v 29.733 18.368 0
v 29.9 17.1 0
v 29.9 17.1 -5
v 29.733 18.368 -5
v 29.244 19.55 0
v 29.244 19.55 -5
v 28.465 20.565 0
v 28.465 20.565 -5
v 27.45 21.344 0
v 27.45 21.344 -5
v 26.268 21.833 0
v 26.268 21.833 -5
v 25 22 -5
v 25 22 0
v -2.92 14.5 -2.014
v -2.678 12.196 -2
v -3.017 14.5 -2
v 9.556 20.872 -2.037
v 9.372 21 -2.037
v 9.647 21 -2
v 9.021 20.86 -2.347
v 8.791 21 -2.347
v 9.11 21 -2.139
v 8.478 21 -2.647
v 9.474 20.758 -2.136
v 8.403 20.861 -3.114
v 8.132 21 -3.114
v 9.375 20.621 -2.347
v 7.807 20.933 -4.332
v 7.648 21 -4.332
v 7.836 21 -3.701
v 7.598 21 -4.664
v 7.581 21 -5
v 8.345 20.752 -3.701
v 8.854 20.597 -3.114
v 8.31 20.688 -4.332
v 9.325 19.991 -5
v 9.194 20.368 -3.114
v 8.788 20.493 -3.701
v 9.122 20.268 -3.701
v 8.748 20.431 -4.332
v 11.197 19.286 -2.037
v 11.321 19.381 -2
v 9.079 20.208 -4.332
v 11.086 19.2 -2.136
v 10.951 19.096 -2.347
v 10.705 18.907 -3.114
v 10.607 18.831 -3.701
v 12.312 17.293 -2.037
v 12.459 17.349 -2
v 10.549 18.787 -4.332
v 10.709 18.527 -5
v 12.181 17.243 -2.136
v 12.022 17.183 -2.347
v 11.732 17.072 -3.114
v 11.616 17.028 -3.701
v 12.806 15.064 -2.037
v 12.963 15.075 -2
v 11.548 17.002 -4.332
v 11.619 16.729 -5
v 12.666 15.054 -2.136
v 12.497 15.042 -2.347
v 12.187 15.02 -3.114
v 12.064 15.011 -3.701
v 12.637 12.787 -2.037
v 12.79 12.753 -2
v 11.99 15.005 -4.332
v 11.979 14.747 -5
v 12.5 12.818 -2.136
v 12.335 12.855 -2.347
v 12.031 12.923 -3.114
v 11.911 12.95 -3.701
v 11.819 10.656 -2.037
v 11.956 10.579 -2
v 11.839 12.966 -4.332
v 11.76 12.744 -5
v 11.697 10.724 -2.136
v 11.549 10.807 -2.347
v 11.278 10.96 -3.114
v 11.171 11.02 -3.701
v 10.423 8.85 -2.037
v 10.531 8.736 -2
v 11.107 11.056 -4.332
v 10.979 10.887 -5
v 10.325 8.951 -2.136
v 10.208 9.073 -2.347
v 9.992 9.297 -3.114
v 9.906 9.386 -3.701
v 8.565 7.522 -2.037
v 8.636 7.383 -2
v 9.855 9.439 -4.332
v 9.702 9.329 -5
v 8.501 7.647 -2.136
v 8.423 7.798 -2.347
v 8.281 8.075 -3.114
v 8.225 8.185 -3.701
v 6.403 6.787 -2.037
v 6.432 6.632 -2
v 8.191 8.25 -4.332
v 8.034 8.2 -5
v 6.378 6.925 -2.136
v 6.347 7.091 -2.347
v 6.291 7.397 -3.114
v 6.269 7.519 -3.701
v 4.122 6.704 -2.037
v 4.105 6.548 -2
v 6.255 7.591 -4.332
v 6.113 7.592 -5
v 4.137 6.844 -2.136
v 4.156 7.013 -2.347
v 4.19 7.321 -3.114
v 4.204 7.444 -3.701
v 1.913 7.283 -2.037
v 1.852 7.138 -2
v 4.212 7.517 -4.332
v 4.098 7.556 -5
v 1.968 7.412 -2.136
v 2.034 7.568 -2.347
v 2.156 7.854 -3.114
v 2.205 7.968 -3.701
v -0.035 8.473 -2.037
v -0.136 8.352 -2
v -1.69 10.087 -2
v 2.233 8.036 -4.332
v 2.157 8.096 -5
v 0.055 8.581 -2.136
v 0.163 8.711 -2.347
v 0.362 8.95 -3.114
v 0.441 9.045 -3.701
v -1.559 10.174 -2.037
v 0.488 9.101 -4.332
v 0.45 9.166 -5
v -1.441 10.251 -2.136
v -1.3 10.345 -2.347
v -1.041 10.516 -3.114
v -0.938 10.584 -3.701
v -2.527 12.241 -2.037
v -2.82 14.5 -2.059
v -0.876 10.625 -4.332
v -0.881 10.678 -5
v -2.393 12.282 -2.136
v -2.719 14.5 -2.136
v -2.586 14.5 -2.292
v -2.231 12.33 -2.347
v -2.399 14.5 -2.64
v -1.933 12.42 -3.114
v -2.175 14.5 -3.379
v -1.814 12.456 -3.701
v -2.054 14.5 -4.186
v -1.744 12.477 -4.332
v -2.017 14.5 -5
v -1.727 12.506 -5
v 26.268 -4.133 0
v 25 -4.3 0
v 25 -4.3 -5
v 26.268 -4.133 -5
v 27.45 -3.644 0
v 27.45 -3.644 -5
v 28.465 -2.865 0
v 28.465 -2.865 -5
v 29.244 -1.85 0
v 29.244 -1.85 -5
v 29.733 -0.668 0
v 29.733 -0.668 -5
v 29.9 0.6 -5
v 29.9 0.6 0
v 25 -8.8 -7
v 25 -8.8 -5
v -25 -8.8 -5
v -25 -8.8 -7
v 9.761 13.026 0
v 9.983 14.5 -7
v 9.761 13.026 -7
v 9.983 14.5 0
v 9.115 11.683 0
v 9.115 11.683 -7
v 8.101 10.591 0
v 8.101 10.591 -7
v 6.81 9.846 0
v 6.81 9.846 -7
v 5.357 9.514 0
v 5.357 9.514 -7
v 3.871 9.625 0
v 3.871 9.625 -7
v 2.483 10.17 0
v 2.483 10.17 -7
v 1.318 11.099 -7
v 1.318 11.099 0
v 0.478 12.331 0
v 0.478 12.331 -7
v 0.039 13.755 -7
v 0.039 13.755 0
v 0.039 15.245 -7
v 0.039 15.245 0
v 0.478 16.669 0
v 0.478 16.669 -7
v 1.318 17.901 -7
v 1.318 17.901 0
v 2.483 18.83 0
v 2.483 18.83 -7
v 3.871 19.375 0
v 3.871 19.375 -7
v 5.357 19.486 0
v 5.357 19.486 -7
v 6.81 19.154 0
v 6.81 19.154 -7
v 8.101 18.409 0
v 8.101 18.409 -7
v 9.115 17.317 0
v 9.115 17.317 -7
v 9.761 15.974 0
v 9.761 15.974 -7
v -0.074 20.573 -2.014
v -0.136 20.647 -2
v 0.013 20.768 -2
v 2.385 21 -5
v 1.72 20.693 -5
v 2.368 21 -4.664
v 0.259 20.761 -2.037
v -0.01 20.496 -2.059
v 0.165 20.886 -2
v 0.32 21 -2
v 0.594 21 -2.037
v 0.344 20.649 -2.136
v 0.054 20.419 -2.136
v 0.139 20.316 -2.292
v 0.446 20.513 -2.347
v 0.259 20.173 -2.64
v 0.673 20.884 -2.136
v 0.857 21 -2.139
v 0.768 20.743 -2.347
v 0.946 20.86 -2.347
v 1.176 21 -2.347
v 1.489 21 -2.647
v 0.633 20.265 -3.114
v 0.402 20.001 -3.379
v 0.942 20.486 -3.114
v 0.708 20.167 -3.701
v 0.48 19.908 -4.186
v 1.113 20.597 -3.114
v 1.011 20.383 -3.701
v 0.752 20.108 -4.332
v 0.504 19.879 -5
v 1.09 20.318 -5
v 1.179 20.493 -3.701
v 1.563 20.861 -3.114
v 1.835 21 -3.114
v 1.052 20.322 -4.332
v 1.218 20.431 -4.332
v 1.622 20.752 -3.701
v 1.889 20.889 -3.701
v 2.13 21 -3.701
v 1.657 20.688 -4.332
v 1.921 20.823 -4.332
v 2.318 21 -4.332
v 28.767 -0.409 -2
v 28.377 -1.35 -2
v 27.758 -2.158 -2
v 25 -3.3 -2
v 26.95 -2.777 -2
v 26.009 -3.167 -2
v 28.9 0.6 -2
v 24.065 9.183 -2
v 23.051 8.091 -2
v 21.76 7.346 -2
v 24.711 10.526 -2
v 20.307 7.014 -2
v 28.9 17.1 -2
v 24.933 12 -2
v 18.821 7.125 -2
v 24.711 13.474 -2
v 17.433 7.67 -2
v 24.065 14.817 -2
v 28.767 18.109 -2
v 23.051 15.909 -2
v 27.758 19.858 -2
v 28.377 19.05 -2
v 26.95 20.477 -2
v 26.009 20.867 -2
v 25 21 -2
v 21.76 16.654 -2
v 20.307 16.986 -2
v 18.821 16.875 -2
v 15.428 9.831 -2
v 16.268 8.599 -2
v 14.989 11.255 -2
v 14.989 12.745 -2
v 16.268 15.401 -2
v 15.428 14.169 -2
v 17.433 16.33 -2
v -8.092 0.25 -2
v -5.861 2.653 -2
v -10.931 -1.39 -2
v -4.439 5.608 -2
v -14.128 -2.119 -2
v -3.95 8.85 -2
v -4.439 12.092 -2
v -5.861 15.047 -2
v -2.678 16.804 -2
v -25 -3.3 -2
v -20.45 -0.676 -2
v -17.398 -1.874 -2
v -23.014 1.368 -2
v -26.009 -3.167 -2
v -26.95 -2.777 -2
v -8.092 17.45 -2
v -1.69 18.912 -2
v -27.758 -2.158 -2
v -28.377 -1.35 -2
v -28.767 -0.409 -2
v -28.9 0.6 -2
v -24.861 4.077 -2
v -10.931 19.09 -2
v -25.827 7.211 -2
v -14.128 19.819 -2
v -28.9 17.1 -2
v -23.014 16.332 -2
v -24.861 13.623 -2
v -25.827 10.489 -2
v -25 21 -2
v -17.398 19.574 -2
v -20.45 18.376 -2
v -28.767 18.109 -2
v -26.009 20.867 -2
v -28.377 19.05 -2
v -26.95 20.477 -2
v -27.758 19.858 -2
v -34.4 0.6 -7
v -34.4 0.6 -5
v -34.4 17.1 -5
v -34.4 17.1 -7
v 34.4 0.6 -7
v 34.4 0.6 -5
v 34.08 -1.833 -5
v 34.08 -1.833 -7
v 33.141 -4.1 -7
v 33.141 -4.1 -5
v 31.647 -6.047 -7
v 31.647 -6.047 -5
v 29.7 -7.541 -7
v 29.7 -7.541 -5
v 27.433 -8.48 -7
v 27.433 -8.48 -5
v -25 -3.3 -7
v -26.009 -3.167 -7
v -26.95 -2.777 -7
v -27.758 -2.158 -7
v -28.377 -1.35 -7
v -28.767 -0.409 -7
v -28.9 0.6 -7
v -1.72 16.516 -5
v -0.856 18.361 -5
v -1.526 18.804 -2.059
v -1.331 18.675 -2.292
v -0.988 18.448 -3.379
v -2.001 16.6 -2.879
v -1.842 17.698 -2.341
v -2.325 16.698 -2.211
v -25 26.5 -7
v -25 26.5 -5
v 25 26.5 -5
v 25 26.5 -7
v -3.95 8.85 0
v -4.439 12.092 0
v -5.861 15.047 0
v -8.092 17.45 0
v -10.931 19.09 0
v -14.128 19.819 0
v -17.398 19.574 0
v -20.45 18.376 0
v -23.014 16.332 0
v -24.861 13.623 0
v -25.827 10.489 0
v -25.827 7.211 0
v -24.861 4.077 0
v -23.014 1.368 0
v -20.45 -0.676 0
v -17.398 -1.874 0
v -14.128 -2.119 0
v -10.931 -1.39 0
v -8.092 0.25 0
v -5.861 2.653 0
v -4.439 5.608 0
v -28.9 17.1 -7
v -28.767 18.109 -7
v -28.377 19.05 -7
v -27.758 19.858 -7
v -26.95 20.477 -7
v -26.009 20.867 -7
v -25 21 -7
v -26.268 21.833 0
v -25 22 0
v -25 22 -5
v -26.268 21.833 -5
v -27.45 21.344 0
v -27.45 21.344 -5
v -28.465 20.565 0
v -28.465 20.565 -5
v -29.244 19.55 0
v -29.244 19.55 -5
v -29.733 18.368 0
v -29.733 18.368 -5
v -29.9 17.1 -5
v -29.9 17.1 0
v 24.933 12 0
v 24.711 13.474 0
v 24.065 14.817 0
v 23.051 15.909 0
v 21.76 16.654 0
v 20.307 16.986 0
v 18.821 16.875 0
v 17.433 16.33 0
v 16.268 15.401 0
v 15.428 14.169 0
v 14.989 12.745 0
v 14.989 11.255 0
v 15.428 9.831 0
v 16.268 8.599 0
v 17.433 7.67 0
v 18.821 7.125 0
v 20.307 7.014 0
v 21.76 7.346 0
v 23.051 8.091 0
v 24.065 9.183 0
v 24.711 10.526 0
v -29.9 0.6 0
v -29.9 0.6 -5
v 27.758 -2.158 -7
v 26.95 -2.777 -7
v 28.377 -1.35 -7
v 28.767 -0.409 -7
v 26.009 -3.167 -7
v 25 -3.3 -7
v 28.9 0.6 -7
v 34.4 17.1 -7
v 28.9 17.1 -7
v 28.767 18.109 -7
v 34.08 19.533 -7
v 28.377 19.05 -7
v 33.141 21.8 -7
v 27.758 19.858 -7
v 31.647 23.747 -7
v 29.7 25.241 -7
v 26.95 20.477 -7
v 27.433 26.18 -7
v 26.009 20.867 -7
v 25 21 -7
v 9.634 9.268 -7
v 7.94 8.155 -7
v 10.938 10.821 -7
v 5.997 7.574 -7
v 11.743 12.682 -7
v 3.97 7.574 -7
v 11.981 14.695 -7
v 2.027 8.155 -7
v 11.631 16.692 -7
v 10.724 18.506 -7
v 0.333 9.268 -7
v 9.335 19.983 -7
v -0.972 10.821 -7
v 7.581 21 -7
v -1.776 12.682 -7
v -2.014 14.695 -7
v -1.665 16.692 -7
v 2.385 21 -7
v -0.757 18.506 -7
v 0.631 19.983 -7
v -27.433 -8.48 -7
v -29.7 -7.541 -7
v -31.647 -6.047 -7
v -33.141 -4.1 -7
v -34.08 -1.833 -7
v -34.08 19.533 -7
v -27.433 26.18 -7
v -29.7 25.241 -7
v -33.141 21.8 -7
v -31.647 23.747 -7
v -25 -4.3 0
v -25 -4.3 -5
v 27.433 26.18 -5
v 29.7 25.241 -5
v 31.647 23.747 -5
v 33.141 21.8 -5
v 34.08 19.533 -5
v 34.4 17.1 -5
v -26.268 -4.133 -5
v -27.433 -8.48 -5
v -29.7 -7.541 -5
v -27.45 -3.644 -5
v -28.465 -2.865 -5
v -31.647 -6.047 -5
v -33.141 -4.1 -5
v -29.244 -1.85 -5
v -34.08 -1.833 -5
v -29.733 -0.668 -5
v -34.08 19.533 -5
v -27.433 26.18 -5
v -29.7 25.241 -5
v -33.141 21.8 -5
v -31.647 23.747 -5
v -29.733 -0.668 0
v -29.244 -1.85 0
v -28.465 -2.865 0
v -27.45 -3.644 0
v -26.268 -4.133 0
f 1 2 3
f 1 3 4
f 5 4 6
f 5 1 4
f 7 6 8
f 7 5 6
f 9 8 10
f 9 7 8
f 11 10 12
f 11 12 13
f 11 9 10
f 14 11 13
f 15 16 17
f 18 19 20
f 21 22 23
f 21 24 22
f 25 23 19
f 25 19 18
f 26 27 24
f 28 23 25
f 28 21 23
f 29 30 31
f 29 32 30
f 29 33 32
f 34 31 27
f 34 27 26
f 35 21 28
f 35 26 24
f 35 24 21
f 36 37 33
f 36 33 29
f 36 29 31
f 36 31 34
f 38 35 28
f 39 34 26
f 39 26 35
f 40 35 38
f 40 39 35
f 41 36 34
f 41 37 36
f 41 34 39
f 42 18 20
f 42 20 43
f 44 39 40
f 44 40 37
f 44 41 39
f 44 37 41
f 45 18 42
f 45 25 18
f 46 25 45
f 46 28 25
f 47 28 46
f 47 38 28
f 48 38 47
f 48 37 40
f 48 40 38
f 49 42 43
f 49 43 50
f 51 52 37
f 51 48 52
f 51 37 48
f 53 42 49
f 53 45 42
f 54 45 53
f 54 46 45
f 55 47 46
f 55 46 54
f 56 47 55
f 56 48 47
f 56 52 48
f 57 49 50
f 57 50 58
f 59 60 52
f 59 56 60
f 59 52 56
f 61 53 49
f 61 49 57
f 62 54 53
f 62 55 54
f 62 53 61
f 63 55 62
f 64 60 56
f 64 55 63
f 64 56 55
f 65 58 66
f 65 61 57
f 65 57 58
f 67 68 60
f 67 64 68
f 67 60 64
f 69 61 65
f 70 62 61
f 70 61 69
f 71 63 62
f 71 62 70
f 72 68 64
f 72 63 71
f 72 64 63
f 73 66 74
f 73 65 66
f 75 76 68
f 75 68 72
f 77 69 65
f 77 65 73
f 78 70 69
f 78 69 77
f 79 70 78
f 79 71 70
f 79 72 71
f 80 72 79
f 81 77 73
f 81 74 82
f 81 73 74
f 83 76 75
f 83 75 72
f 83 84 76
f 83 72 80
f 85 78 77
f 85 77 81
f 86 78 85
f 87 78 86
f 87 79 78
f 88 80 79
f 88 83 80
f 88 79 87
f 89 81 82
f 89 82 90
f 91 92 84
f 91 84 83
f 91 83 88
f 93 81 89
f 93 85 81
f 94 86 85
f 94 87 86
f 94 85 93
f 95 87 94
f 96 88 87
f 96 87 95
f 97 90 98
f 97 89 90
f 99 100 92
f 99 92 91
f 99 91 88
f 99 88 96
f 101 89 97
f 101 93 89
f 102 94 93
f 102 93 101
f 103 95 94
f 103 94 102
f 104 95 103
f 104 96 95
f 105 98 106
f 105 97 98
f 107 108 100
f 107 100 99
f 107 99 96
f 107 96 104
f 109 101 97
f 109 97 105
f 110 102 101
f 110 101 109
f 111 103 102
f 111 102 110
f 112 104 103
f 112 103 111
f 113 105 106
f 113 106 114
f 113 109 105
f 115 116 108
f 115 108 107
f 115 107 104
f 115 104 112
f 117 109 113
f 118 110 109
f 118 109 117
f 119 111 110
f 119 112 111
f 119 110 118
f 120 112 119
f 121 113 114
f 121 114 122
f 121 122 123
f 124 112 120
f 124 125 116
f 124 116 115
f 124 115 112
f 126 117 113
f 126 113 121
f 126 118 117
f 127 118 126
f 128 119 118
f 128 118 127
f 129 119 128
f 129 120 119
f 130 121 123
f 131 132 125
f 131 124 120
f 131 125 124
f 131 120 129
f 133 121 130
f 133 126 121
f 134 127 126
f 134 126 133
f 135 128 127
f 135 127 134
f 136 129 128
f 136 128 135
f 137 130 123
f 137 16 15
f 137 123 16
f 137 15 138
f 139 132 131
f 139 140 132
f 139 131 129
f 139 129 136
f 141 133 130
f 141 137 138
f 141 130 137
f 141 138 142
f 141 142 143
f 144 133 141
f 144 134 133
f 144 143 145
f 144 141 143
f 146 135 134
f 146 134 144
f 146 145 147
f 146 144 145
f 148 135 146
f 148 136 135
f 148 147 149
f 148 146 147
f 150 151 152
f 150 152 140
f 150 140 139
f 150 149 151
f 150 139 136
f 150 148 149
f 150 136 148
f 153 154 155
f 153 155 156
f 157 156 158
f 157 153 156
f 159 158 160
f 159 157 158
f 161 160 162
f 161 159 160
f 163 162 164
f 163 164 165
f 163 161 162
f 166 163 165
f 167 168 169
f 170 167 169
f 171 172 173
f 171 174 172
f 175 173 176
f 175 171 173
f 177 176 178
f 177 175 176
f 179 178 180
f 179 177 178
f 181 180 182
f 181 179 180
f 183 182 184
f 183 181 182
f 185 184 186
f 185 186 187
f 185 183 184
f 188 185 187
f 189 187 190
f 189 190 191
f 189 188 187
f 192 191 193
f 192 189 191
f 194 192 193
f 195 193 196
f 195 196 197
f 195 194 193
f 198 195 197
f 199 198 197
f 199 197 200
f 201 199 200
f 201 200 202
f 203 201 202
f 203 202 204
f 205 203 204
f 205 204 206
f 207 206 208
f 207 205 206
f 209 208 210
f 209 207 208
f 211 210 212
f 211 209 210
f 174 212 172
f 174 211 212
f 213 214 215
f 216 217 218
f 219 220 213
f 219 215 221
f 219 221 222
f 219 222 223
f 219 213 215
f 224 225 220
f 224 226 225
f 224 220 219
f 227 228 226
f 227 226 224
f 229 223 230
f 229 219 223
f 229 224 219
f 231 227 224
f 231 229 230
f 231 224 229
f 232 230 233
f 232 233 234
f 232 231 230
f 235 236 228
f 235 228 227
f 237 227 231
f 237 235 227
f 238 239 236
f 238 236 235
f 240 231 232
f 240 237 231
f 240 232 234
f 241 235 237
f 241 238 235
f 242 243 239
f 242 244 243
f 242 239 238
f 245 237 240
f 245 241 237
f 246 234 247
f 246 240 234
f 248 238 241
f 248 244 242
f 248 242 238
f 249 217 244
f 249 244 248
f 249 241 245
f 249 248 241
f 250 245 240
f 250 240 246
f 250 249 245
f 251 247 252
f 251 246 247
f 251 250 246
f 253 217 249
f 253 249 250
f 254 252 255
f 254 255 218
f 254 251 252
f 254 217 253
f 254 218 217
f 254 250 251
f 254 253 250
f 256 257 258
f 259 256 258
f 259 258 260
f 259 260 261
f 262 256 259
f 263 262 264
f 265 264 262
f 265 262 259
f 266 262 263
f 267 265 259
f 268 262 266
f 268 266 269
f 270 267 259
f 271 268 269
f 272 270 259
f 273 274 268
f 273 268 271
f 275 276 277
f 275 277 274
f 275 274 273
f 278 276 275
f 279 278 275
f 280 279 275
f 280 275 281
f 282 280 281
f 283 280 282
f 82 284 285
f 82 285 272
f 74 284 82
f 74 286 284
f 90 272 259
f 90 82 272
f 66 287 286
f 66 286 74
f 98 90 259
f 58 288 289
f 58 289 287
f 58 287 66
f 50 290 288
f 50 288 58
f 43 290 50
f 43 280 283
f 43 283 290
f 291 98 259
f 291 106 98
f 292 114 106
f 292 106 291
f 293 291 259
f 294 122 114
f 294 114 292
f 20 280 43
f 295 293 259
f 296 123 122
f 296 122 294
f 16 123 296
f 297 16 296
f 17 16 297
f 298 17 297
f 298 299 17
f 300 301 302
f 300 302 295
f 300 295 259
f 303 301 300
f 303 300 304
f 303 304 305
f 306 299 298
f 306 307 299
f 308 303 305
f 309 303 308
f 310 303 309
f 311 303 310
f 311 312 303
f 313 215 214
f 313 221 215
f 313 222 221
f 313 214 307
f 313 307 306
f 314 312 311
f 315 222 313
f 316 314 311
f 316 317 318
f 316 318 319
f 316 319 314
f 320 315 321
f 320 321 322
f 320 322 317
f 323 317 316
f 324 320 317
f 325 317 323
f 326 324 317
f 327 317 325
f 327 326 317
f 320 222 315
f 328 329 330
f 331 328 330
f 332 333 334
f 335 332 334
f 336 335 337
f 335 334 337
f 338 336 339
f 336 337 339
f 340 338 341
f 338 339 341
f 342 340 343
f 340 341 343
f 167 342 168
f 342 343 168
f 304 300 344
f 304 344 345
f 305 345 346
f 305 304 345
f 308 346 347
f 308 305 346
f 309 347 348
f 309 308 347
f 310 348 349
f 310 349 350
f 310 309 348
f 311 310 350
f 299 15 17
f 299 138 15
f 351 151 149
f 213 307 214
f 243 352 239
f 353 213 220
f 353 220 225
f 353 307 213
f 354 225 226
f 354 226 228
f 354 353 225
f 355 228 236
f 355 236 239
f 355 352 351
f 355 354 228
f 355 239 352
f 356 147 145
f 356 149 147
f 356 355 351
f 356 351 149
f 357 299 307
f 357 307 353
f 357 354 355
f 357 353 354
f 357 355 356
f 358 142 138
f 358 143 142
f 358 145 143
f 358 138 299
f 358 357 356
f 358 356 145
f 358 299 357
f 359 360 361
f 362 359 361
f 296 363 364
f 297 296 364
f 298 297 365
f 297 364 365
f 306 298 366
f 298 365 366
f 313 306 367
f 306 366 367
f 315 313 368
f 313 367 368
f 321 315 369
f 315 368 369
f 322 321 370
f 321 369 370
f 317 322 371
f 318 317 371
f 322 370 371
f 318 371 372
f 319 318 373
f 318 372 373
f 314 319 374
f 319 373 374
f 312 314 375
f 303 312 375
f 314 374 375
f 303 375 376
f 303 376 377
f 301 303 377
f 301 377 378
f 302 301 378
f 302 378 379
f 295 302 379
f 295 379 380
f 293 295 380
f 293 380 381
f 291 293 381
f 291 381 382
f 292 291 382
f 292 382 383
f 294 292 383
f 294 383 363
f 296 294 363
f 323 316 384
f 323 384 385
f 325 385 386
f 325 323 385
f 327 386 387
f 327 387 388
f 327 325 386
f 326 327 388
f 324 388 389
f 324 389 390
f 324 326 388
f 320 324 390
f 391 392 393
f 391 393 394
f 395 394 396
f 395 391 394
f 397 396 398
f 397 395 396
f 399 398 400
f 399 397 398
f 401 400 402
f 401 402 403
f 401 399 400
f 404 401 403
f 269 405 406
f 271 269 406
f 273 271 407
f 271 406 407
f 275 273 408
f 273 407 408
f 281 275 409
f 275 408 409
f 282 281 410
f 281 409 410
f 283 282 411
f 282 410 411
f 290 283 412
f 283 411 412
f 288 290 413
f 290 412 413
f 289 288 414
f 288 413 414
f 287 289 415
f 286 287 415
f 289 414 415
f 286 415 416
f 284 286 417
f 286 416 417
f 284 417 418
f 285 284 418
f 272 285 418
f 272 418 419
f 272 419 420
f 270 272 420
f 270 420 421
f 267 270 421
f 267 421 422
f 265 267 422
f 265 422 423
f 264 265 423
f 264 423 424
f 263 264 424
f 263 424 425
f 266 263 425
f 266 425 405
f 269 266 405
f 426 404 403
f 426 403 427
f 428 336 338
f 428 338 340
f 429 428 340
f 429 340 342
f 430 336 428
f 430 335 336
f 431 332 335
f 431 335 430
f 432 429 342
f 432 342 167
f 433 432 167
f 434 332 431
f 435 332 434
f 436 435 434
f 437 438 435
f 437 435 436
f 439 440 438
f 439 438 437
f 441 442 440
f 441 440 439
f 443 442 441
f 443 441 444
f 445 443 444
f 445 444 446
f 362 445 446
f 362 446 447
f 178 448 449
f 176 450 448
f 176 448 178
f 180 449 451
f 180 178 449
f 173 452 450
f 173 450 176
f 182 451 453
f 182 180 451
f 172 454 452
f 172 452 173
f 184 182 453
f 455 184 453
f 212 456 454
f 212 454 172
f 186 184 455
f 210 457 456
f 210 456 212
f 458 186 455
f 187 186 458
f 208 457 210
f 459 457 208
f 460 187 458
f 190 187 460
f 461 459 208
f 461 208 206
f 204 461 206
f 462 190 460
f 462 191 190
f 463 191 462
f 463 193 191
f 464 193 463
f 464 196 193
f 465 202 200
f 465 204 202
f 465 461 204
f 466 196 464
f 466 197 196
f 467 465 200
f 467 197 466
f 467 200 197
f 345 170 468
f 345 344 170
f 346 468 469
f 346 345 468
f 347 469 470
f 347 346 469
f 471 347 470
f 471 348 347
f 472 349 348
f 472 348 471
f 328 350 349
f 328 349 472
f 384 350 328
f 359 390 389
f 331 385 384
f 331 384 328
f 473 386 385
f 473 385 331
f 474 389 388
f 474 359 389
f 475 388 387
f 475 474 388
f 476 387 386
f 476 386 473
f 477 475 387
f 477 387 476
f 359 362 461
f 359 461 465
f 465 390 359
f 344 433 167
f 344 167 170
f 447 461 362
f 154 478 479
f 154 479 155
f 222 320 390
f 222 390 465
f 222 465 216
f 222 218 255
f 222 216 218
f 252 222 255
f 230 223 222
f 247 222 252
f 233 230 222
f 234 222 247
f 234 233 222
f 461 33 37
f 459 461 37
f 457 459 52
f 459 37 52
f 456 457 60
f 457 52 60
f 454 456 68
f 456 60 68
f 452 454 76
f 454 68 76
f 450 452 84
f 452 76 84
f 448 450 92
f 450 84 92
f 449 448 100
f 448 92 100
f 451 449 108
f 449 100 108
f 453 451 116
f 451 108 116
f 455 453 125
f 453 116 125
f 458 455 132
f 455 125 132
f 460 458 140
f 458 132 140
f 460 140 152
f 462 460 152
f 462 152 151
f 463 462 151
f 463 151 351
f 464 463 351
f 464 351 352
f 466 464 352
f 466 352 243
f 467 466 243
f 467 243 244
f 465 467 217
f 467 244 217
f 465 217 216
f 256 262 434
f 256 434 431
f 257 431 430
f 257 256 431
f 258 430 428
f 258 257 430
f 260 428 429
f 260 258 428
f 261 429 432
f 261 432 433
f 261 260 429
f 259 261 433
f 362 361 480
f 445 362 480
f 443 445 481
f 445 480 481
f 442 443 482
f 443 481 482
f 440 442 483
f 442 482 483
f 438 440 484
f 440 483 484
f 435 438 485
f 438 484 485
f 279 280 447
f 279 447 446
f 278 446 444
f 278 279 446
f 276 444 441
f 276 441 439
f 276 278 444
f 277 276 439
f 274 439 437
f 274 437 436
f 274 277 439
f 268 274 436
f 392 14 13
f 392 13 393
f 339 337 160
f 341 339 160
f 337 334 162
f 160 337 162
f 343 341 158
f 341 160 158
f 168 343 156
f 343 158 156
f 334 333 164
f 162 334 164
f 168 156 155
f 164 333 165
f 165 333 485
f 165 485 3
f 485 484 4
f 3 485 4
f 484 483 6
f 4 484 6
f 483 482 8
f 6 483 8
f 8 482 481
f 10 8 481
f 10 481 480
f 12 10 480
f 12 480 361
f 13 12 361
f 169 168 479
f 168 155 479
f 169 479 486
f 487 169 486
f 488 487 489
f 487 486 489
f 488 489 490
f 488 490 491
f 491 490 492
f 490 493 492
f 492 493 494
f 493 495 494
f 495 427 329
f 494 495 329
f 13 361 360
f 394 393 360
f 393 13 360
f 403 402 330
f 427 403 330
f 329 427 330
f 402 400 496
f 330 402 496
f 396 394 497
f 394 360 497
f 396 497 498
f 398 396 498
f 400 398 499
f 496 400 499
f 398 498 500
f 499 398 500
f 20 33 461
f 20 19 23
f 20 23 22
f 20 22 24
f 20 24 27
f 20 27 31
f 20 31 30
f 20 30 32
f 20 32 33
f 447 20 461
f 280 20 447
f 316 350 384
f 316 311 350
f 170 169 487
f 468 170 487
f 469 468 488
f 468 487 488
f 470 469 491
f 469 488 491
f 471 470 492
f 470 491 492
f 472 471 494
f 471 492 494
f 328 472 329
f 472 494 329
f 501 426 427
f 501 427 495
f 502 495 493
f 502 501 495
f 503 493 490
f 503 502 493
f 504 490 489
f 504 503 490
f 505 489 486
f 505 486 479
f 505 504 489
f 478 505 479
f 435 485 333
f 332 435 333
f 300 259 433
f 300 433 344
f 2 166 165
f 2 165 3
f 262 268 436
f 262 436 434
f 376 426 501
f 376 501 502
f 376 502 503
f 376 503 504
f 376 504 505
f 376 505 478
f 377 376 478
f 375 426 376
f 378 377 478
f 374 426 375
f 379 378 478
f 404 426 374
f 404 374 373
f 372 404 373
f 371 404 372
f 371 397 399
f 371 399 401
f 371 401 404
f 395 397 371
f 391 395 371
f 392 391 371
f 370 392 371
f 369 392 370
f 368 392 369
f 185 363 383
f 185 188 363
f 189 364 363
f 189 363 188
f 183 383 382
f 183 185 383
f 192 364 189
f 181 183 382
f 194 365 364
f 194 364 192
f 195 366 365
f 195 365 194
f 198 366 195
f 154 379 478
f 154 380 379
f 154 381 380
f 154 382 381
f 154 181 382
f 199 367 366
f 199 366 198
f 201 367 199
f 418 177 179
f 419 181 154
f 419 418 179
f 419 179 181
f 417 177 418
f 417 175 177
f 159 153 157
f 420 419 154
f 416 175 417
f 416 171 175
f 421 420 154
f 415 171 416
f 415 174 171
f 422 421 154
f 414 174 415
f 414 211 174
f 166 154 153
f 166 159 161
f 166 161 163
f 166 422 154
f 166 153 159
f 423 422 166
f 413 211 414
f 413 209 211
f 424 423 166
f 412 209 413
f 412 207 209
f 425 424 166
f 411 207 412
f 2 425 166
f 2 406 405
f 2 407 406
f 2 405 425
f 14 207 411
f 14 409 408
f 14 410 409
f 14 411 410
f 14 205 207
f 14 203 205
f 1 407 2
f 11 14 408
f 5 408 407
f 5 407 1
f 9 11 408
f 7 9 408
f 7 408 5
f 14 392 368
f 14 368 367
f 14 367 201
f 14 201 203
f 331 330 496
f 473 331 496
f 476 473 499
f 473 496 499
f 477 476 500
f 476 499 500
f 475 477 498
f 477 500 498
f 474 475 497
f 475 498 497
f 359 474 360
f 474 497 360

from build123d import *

# Parameters (mm, degrees)
BOSS_EXTRUDE1_DEPTH = 5
BOSS_EXTRUDE3_DEPTH = 2
CUT_EXTRUDE1_START  = -3
CUT_EXTRUDE1_DEPTH  = 3
SKETCH4_R           = 5
SKETCH4_R_2         = 11
CUT_EXTRUDE2_DEPTH  = 44.984201709
SKETCH5_R           = 7
SKETCH5_R_2         = 5
BOSS_EXTRUDE4_DEPTH = 5
FILLET1_SIZE        = 1
FILLET1_SIZE_2      = 3


with BuildPart() as part:
    # Sketch1 → Boss-Extrude1 (new body)
    with BuildSketch(Plane.XY):
        with BuildLine():
            Line((-29.9, 17.1), (-29.9, 0.6))
            ThreePointArc((-29.9, 0.6), (-28.464823228, -2.864823228), (-25, -4.3))
            Line((-25, -4.3), (25, -4.3))
            ThreePointArc((25, -4.3), (28.464823228, -2.864823228), (29.9, 0.6))
            Line((29.9, 0.6), (29.9, 17.1))
            ThreePointArc((29.9, 17.1), (28.464823228, 20.564823228), (25, 22))
            Line((25, 22), (-25, 22))
            ThreePointArc((-25, 22), (-28.464823228, 20.564823228), (-29.9, 17.1))
        make_face()
    extrude(amount=-BOSS_EXTRUDE1_DEPTH)

    # Sketch2 → Boss-Extrude3 (add)
    with BuildSketch(Plane(origin=(0, 0, -5), x_dir=(-1, 0, 0), z_dir=(0, 0, -1))):
        with BuildLine():
            Line((34.4, 0.6), (34.4, 17.1))
            ThreePointArc((34.4, 17.1), (31.646803743, 23.746803743), (25, 26.5))
            Line((25, 26.5), (-25, 26.5))
            ThreePointArc((-25, 26.5), (-31.646803743, 23.746803743), (-34.4, 17.1))
            Line((-34.4, 17.1), (-34.4, 0.6))
            ThreePointArc((-34.4, 0.6), (-31.646803743, -6.046803743), (-25, -8.8))
            Line((-25, -8.8), (25, -8.8))
            ThreePointArc((25, -8.8), (31.646803743, -6.046803743), (34.4, 0.6))
        make_face()
        with BuildLine():
            Line((28.9, 0.6), (28.9, 17.1))
            ThreePointArc((28.9, 17.1), (27.757716447, 19.857716447), (25, 21))
            Line((25, 21), (-25, 21))
            ThreePointArc((-25, 21), (-27.757716447, 19.857716447), (-28.9, 17.1))
            Line((-28.9, 17.1), (-28.9, 0.6))
            ThreePointArc((-28.9, 0.6), (-27.757716447, -2.157716447), (-25, -3.3))
            Line((-25, -3.3), (25, -3.3))
            ThreePointArc((25, -3.3), (27.757716447, -2.157716447), (28.9, 0.6))
        make_face(mode=Mode.SUBTRACT)
    extrude(amount=BOSS_EXTRUDE3_DEPTH)

    # Sketch3 → Cut-Extrude1 (cut)
    with BuildSketch(Plane(origin=(0, 0, -5), x_dir=(-1, 0, 0), z_dir=(0, 0, -1)).offset(CUT_EXTRUDE1_START)):
        with BuildLine():
            Line((-25, -3.3), (25, -3.3))
            ThreePointArc((25, -3.3), (27.757716447, -2.157716447), (28.9, 0.6))
            Line((28.9, 0.6), (28.9, 17.1))
            ThreePointArc((28.9, 17.1), (27.757716447, 19.857716447), (25, 21))
            Line((25, 21), (-25, 21))
            ThreePointArc((-25, 21), (-27.757716447, 19.857716447), (-28.9, 17.1))
            Line((-28.9, 17.1), (-28.9, 0.6))
            ThreePointArc((-28.9, 0.6), (-27.757716447, -2.157716447), (-25, -3.3))
        make_face()
    extrude(amount=CUT_EXTRUDE1_DEPTH, mode=Mode.SUBTRACT)

    # Sketch4 → Cut-Extrude2 (cut, through all)
    with BuildSketch(Plane.XY):
        with Locations((4.983333333, 14.5)):
            Circle(SKETCH4_R)
        with Locations((-14.95, 8.85)):
            Circle(SKETCH4_R_2)
        with Locations((19.933333333, 12)):
            Circle(SKETCH4_R)
    extrude(amount=-CUT_EXTRUDE2_DEPTH, mode=Mode.SUBTRACT)

    # Sketch5 → Boss-Extrude4 (add)
    with BuildSketch(Plane(origin=(0, 0, -2), x_dir=(-1, 0, 0), z_dir=(0, 0, -1))):
        with Locations((-4.983333333, 14.5)):
            Circle(SKETCH5_R)
        with Locations(Location((-4.983333333, 14.5, 0), (0, 0, 180))):
            Circle(SKETCH5_R_2, mode=Mode.SUBTRACT)
    extrude(amount=BOSS_EXTRUDE4_DEPTH)

    # Fillet1
    # an asymmetric fillet: 3, 1 mm, written as the material it adds along each edge
    with BuildSketch(Plane(origin=(4.983333333, 14.5, -2), x_dir=(-0.6399684103972102, 0.7684012192166719, 0), z_dir=(-0.7684012192166719, -0.6399684103972102, 0))) as fillet1_piece_1_section:
        with BuildLine():
            Bezier((7 + FILLET1_SIZE, 0), (7, 0), (7, FILLET1_SIZE_2), weights=[1, 0.707106781, 1])
            Line((7, FILLET1_SIZE_2), (7, 0))
            Line((7, 0), (7 + FILLET1_SIZE, 0))
        make_face()
    fillet1_piece_1 = revolve(axis=Axis((4.983333333, 14.5, -2), (0, 0, -1)), revolution_arc=309.789463983, mode=Mode.PRIVATE)
    fillet1_piece_1 = split(fillet1_piece_1, bisect_by=Plane(origin=(1.135555839, 21, -2.732538618), z_dir=(0, -1, 0)), keep=Keep.TOP, mode=Mode.PRIVATE)
    add(fillet1_piece_1)
    with BuildSketch(Plane(origin=(4.983333333, 14.5, -2), x_dir=(-1, 0, 0), z_dir=(0, -1, 0))) as fillet1_piece_2_section:
        with BuildLine():
            Bezier((7 + FILLET1_SIZE, 0), (7, 0), (7, FILLET1_SIZE_2), weights=[1, 0.707106781, 1])
            Line((7, FILLET1_SIZE_2), (7, 0))
            Line((7, 0), (7 + FILLET1_SIZE, 0))
        make_face()
    fillet1_piece_2 = revolve(axis=Axis((4.983333333, 14.5, -2), (0, 0, -1)), revolution_arc=129.61571024, mode=Mode.PRIVATE)
    fillet1_piece_2 = split(fillet1_piece_2, bisect_by=Plane(origin=(-1.041526042, 21, -2.873194596), z_dir=(0, -1, 0)), keep=Keep.TOP, mode=Mode.PRIVATE)
    add(fillet1_piece_2)


solid = part.part
